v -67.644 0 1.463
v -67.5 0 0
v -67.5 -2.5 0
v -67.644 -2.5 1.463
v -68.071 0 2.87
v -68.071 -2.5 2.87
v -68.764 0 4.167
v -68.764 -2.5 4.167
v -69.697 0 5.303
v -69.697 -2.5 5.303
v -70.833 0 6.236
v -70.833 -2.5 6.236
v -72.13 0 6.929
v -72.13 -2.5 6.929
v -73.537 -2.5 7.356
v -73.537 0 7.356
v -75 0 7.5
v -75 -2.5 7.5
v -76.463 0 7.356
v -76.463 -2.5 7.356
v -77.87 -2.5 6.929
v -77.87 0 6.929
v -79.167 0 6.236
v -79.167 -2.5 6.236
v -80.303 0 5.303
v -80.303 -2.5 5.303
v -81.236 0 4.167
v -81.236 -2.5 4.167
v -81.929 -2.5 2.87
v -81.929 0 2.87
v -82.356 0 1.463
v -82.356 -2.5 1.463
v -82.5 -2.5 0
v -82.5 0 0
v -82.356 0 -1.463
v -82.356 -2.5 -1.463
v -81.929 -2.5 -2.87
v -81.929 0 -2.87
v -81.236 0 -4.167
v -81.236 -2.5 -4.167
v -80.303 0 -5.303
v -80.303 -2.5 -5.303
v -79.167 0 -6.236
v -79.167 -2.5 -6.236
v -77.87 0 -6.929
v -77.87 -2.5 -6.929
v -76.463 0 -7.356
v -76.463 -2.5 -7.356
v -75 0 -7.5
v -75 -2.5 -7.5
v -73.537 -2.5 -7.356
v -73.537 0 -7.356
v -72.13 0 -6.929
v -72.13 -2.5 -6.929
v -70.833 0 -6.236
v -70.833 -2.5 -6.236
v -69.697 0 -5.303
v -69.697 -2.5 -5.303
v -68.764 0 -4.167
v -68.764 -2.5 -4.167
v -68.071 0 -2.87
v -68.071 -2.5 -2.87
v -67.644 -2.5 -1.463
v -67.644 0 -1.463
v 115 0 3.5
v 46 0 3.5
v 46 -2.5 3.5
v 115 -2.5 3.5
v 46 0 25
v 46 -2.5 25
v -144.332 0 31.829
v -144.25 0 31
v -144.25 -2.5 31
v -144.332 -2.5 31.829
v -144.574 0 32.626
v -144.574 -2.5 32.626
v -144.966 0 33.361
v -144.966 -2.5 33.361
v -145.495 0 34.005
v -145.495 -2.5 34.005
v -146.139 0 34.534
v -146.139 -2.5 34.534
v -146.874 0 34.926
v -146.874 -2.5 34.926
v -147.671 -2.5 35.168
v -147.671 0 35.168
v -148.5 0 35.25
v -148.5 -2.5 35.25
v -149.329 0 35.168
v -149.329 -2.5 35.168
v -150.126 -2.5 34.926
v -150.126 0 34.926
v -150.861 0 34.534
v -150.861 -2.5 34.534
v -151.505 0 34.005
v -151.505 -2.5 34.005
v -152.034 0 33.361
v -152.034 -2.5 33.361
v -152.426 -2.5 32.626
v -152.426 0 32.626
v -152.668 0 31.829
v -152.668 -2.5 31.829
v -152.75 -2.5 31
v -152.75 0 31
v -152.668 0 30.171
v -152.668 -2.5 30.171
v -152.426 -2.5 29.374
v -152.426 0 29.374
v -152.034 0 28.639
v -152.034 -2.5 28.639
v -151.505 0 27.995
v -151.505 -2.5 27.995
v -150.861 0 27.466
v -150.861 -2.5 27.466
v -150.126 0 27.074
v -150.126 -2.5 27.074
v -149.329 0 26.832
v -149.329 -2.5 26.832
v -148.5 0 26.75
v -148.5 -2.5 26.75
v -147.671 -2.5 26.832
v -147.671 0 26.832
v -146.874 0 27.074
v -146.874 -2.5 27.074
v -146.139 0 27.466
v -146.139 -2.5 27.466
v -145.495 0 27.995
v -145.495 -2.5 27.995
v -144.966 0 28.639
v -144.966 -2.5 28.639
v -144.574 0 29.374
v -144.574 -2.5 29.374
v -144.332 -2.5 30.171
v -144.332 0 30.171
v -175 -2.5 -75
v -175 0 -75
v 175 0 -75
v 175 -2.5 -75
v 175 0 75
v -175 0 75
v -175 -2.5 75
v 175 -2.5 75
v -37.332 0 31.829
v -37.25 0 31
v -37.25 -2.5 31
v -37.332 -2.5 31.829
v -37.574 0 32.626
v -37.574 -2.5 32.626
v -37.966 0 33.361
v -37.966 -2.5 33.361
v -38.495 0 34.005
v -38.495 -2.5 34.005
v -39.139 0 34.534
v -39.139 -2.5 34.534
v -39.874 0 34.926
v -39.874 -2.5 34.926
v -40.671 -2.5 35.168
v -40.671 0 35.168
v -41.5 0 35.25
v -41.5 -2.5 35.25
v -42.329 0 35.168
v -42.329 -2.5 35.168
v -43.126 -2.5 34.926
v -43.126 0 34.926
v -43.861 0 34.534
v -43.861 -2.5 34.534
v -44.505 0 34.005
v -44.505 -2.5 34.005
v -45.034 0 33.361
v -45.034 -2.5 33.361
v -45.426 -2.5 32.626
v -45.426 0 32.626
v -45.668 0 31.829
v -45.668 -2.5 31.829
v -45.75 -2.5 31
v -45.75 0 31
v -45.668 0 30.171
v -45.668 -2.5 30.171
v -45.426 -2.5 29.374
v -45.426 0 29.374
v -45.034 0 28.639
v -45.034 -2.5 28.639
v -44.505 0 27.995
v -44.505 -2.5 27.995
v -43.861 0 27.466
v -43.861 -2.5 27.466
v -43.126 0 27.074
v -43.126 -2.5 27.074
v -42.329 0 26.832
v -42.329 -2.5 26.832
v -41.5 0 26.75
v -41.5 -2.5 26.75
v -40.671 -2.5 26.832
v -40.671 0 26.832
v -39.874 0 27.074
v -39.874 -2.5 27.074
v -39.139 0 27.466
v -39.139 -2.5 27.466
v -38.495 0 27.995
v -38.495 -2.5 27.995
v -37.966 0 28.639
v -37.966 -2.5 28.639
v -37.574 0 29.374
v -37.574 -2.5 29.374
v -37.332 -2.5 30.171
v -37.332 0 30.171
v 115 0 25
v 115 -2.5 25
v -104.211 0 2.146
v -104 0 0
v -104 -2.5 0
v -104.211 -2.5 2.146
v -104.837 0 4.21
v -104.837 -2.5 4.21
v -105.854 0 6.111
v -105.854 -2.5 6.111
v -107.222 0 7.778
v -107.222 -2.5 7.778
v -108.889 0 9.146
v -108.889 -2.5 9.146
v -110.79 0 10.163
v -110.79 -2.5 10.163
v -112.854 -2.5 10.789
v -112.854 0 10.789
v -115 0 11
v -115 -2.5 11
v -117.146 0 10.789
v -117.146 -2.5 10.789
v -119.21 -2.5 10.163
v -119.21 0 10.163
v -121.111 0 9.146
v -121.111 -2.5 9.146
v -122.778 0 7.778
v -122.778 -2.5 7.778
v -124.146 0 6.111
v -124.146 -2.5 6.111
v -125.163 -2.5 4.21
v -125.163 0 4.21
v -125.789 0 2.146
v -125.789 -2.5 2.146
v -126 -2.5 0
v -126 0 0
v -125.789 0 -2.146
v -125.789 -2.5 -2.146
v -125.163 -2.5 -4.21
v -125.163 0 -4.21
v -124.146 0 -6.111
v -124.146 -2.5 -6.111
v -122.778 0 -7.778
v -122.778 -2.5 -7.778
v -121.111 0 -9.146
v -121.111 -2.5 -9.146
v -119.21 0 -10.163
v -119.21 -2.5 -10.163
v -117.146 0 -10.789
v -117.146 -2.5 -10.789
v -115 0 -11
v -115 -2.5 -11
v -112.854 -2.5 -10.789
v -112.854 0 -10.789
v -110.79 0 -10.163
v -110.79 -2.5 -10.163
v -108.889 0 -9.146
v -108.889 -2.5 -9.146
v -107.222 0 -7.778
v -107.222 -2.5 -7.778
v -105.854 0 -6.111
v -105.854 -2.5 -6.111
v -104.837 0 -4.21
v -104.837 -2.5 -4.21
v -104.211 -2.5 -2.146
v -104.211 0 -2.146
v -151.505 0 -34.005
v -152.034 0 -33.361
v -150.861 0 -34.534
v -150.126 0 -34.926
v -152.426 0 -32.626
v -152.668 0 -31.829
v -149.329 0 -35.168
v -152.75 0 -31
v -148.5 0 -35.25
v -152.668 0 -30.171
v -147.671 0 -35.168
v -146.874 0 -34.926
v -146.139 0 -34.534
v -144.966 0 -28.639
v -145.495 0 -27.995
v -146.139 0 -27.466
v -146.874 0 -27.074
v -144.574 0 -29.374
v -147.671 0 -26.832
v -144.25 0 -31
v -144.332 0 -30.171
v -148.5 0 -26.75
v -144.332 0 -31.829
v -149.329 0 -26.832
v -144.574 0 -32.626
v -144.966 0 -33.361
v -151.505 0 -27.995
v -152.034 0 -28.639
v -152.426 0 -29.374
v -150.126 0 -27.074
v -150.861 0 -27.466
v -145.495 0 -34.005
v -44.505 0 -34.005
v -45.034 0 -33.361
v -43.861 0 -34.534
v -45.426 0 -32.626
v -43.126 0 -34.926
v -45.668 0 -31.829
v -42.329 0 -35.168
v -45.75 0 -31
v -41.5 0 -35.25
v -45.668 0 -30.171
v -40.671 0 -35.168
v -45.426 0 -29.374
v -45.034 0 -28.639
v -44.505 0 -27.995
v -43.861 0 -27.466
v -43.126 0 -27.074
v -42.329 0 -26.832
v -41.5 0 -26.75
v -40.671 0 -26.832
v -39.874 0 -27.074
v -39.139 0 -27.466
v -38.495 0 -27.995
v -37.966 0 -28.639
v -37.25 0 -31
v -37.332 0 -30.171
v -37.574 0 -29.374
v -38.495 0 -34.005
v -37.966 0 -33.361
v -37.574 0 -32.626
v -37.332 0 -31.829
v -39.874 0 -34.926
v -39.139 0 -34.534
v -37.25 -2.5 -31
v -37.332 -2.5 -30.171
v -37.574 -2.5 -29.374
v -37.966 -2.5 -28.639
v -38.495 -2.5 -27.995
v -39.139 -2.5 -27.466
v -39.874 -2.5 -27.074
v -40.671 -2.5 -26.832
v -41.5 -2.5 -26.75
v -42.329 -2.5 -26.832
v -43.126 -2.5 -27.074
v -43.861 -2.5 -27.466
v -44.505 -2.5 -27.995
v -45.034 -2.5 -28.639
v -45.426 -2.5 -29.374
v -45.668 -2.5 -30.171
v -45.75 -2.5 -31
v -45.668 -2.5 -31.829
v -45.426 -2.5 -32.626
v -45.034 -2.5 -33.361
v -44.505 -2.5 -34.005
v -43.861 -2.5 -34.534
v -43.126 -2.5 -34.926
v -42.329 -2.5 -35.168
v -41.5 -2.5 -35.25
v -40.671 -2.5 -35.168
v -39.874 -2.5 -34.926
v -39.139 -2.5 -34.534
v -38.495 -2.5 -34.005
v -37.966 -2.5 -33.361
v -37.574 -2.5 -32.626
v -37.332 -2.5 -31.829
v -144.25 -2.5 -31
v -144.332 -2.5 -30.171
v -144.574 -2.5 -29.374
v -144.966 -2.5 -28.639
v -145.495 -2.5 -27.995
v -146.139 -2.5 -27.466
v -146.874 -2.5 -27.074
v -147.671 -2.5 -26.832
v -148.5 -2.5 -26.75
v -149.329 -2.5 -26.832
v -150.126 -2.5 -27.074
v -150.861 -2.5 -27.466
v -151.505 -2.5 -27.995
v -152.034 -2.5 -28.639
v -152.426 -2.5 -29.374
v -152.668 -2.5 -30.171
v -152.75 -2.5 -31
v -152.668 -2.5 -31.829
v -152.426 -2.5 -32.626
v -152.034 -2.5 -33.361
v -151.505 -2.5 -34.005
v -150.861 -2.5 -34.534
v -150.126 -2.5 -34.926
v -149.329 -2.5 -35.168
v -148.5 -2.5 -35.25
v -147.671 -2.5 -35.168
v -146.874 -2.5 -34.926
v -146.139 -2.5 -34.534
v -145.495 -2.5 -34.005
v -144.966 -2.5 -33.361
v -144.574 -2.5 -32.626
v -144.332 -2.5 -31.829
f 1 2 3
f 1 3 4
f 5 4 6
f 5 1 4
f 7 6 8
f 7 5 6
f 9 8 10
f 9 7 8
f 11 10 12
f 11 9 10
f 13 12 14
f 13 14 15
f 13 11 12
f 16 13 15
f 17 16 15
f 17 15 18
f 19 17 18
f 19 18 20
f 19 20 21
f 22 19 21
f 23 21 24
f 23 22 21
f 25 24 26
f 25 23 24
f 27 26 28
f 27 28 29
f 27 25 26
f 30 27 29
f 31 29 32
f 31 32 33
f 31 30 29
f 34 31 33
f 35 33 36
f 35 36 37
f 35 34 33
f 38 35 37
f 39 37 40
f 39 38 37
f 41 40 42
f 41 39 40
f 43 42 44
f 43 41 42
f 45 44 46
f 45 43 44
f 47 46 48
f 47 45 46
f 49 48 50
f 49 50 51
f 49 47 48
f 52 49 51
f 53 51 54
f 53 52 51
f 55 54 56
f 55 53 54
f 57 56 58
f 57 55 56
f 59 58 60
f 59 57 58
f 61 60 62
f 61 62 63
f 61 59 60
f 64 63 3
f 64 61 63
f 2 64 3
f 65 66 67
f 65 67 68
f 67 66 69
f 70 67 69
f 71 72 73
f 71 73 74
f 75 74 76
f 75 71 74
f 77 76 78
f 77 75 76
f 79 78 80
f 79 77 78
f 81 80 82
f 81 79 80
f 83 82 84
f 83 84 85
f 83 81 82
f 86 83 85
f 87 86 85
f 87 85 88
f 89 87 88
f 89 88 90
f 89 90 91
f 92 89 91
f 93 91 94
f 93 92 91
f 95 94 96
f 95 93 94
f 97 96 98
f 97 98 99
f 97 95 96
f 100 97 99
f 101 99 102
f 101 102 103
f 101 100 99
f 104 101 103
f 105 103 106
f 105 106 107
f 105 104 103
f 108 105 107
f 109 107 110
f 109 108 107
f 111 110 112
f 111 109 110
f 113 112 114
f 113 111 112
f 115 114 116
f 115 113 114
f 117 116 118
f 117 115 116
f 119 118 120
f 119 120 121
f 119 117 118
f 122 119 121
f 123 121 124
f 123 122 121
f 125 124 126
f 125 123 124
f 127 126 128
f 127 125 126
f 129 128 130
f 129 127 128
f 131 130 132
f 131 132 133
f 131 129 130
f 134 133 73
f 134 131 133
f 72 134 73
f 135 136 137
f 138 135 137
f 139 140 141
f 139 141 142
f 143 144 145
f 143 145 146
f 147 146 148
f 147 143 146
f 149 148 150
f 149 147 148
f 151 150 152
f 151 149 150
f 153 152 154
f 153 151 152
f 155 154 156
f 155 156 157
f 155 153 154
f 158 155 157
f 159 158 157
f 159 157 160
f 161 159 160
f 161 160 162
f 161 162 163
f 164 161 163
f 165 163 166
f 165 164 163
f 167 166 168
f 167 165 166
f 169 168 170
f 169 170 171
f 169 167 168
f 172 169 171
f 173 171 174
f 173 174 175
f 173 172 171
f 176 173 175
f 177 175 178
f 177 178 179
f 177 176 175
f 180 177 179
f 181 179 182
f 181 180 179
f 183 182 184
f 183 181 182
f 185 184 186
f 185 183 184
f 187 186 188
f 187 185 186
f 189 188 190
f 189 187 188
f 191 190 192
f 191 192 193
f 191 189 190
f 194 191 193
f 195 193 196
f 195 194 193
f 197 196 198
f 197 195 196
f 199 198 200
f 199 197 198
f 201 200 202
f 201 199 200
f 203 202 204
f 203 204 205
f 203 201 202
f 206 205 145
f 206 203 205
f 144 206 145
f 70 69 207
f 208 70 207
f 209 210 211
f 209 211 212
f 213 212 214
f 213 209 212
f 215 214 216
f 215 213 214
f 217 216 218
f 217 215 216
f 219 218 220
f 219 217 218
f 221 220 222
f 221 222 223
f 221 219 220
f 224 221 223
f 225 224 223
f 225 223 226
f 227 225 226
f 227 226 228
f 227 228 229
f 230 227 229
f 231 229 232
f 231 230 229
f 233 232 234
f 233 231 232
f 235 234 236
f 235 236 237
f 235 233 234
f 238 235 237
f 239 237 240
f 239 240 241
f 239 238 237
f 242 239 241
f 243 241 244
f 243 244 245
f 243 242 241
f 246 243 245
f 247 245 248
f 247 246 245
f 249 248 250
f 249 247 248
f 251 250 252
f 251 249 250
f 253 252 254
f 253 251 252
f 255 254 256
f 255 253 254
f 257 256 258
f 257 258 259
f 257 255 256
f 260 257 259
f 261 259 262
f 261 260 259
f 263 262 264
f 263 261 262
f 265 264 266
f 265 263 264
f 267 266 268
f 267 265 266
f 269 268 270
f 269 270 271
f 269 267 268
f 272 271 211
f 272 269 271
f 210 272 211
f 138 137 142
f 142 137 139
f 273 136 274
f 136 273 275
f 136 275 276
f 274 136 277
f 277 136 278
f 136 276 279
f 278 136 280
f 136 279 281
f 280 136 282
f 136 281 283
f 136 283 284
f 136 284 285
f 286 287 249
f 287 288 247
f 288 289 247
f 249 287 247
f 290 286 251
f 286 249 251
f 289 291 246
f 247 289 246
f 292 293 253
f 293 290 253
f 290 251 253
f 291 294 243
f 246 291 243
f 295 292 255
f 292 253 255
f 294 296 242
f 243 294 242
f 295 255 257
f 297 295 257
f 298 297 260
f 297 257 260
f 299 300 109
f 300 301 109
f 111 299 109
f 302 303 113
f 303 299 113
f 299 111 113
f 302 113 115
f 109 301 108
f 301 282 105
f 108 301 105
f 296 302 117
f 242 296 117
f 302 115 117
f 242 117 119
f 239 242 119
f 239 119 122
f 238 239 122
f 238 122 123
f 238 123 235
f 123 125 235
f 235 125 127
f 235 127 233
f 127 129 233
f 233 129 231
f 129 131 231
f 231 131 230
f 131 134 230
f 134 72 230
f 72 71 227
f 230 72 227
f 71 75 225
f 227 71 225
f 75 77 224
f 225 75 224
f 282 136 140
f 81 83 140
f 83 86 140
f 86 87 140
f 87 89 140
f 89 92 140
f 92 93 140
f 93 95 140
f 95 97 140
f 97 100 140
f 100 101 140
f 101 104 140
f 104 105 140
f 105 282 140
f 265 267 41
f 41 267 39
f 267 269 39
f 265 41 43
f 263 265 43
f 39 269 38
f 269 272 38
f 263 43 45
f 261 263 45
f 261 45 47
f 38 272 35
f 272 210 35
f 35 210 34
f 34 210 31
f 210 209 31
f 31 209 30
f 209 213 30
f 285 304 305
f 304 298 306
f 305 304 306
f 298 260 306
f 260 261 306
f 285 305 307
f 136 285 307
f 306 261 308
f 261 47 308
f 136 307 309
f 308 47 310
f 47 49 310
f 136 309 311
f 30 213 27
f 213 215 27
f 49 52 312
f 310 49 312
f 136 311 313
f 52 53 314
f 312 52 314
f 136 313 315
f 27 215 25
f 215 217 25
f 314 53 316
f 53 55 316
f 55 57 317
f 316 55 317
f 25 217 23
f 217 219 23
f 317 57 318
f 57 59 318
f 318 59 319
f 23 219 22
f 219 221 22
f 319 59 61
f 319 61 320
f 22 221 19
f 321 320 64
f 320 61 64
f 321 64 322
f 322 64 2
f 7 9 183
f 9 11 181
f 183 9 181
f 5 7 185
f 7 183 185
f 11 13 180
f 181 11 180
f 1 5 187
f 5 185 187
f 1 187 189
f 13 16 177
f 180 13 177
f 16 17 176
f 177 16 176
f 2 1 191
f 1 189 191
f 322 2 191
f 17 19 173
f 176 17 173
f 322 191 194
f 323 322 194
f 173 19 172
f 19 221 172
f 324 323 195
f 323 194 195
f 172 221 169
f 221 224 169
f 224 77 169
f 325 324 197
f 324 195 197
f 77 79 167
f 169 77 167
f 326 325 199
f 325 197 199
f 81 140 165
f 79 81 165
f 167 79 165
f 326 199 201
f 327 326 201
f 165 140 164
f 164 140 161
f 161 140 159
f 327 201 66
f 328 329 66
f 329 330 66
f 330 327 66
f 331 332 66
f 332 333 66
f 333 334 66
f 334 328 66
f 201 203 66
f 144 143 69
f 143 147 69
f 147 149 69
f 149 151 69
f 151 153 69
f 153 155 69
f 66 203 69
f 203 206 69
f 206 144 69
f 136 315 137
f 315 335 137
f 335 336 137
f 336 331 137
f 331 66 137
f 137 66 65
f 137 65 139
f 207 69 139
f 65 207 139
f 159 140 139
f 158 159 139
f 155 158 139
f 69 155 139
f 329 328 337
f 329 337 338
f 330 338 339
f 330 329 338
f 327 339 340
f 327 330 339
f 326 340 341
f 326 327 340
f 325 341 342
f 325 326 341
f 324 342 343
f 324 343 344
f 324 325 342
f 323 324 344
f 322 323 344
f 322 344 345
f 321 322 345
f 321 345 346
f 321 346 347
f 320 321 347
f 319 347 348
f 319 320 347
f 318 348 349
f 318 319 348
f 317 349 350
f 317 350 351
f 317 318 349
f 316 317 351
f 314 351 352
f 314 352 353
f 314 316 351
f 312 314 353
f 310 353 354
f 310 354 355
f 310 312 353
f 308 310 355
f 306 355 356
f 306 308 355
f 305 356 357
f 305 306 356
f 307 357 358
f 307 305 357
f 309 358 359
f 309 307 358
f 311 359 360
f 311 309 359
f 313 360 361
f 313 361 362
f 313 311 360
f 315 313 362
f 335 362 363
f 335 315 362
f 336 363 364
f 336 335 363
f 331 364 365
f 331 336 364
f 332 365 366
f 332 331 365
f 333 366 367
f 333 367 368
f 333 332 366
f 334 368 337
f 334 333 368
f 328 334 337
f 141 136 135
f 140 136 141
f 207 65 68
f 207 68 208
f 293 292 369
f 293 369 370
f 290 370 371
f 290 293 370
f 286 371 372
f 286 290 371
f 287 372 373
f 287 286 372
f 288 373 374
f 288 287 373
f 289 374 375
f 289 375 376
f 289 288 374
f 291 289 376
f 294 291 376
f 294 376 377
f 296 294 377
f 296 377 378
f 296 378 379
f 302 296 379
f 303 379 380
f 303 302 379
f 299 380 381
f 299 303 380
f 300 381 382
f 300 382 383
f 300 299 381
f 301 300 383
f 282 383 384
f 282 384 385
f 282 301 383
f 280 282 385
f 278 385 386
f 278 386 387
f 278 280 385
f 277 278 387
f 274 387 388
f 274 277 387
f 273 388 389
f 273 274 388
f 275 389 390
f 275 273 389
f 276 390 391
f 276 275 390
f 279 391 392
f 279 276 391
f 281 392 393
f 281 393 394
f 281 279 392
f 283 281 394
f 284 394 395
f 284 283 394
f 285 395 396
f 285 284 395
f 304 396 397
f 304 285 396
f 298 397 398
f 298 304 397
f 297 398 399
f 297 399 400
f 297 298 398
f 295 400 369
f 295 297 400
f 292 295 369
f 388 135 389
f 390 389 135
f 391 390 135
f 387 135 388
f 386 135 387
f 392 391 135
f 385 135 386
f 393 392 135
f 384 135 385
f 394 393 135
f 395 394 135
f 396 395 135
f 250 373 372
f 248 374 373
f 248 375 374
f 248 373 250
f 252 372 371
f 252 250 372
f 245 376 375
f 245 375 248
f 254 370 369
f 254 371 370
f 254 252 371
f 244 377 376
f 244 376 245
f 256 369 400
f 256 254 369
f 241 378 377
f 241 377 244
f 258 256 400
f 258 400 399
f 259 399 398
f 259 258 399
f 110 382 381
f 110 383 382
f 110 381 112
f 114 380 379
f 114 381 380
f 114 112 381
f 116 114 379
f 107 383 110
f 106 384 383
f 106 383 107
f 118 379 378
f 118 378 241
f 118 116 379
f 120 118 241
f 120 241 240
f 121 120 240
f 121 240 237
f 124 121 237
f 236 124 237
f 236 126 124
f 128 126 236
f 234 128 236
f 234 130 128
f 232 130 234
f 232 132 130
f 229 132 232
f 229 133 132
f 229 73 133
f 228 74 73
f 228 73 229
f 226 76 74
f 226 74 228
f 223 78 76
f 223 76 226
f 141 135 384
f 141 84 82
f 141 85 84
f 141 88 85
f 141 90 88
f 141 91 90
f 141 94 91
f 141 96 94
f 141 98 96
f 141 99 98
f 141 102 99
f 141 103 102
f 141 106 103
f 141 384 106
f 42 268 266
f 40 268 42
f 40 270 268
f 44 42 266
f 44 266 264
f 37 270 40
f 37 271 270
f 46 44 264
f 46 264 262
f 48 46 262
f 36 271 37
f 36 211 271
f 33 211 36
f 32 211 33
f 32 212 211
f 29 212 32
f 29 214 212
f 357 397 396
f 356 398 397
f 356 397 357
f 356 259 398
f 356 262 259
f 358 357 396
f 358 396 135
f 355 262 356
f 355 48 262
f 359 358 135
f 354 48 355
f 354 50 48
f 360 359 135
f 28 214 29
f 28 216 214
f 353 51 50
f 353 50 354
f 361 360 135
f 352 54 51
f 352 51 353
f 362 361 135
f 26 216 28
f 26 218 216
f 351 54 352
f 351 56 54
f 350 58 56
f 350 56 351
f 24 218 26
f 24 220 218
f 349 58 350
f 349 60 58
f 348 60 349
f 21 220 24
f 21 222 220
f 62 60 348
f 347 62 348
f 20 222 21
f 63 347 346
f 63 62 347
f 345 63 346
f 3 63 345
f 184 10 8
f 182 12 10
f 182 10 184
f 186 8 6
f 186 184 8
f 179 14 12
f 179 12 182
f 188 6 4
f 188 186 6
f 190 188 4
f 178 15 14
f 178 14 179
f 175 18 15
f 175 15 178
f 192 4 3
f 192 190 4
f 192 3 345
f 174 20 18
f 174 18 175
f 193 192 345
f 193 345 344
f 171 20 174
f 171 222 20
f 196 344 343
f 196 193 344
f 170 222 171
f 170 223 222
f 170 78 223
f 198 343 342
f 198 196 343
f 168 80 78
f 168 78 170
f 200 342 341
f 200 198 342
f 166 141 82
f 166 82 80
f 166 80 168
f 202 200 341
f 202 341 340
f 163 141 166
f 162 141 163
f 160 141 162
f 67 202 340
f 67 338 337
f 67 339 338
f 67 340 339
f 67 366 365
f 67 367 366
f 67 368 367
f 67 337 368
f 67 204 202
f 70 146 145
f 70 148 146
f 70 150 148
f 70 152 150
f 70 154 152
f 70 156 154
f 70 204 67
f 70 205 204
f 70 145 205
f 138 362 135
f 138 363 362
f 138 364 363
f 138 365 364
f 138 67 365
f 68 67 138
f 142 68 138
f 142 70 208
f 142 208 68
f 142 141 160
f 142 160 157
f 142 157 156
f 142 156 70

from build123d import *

# Parameters (mm, degrees)
F0_W     = 350
F0_H     = 150
F0_R     = 4.25
F0_R_2   = 11
F0_R_3   = 7.5
F0_W_2   = 69
F0_H_2   = 21.5
F1_DEPTH = 2.5


with BuildPart() as f1:
    # F0 (on Front) → F1 (new body)
    with BuildSketch(Plane.XZ):
        Rectangle(F0_W, F0_H)
        with Locations((-148.5, -31)):
            Circle(F0_R, mode=Mode.SUBTRACT)
        with Locations((-41.5, -31)):
            Circle(F0_R, mode=Mode.SUBTRACT)
        with Locations((-115, 0)):
            Circle(F0_R_2, mode=Mode.SUBTRACT)
        with Locations((-148.5, 31)):
            Circle(F0_R, mode=Mode.SUBTRACT)
        with Locations((-75, 0)):
            Circle(F0_R_3, mode=Mode.SUBTRACT)
        with Locations((-41.5, 31)):
            Circle(F0_R, mode=Mode.SUBTRACT)
        with Locations((80.5, 14.25)):
            Rectangle(F0_W_2, F0_H_2, mode=Mode.SUBTRACT)
    extrude(amount=F1_DEPTH)


solid = f1.part
